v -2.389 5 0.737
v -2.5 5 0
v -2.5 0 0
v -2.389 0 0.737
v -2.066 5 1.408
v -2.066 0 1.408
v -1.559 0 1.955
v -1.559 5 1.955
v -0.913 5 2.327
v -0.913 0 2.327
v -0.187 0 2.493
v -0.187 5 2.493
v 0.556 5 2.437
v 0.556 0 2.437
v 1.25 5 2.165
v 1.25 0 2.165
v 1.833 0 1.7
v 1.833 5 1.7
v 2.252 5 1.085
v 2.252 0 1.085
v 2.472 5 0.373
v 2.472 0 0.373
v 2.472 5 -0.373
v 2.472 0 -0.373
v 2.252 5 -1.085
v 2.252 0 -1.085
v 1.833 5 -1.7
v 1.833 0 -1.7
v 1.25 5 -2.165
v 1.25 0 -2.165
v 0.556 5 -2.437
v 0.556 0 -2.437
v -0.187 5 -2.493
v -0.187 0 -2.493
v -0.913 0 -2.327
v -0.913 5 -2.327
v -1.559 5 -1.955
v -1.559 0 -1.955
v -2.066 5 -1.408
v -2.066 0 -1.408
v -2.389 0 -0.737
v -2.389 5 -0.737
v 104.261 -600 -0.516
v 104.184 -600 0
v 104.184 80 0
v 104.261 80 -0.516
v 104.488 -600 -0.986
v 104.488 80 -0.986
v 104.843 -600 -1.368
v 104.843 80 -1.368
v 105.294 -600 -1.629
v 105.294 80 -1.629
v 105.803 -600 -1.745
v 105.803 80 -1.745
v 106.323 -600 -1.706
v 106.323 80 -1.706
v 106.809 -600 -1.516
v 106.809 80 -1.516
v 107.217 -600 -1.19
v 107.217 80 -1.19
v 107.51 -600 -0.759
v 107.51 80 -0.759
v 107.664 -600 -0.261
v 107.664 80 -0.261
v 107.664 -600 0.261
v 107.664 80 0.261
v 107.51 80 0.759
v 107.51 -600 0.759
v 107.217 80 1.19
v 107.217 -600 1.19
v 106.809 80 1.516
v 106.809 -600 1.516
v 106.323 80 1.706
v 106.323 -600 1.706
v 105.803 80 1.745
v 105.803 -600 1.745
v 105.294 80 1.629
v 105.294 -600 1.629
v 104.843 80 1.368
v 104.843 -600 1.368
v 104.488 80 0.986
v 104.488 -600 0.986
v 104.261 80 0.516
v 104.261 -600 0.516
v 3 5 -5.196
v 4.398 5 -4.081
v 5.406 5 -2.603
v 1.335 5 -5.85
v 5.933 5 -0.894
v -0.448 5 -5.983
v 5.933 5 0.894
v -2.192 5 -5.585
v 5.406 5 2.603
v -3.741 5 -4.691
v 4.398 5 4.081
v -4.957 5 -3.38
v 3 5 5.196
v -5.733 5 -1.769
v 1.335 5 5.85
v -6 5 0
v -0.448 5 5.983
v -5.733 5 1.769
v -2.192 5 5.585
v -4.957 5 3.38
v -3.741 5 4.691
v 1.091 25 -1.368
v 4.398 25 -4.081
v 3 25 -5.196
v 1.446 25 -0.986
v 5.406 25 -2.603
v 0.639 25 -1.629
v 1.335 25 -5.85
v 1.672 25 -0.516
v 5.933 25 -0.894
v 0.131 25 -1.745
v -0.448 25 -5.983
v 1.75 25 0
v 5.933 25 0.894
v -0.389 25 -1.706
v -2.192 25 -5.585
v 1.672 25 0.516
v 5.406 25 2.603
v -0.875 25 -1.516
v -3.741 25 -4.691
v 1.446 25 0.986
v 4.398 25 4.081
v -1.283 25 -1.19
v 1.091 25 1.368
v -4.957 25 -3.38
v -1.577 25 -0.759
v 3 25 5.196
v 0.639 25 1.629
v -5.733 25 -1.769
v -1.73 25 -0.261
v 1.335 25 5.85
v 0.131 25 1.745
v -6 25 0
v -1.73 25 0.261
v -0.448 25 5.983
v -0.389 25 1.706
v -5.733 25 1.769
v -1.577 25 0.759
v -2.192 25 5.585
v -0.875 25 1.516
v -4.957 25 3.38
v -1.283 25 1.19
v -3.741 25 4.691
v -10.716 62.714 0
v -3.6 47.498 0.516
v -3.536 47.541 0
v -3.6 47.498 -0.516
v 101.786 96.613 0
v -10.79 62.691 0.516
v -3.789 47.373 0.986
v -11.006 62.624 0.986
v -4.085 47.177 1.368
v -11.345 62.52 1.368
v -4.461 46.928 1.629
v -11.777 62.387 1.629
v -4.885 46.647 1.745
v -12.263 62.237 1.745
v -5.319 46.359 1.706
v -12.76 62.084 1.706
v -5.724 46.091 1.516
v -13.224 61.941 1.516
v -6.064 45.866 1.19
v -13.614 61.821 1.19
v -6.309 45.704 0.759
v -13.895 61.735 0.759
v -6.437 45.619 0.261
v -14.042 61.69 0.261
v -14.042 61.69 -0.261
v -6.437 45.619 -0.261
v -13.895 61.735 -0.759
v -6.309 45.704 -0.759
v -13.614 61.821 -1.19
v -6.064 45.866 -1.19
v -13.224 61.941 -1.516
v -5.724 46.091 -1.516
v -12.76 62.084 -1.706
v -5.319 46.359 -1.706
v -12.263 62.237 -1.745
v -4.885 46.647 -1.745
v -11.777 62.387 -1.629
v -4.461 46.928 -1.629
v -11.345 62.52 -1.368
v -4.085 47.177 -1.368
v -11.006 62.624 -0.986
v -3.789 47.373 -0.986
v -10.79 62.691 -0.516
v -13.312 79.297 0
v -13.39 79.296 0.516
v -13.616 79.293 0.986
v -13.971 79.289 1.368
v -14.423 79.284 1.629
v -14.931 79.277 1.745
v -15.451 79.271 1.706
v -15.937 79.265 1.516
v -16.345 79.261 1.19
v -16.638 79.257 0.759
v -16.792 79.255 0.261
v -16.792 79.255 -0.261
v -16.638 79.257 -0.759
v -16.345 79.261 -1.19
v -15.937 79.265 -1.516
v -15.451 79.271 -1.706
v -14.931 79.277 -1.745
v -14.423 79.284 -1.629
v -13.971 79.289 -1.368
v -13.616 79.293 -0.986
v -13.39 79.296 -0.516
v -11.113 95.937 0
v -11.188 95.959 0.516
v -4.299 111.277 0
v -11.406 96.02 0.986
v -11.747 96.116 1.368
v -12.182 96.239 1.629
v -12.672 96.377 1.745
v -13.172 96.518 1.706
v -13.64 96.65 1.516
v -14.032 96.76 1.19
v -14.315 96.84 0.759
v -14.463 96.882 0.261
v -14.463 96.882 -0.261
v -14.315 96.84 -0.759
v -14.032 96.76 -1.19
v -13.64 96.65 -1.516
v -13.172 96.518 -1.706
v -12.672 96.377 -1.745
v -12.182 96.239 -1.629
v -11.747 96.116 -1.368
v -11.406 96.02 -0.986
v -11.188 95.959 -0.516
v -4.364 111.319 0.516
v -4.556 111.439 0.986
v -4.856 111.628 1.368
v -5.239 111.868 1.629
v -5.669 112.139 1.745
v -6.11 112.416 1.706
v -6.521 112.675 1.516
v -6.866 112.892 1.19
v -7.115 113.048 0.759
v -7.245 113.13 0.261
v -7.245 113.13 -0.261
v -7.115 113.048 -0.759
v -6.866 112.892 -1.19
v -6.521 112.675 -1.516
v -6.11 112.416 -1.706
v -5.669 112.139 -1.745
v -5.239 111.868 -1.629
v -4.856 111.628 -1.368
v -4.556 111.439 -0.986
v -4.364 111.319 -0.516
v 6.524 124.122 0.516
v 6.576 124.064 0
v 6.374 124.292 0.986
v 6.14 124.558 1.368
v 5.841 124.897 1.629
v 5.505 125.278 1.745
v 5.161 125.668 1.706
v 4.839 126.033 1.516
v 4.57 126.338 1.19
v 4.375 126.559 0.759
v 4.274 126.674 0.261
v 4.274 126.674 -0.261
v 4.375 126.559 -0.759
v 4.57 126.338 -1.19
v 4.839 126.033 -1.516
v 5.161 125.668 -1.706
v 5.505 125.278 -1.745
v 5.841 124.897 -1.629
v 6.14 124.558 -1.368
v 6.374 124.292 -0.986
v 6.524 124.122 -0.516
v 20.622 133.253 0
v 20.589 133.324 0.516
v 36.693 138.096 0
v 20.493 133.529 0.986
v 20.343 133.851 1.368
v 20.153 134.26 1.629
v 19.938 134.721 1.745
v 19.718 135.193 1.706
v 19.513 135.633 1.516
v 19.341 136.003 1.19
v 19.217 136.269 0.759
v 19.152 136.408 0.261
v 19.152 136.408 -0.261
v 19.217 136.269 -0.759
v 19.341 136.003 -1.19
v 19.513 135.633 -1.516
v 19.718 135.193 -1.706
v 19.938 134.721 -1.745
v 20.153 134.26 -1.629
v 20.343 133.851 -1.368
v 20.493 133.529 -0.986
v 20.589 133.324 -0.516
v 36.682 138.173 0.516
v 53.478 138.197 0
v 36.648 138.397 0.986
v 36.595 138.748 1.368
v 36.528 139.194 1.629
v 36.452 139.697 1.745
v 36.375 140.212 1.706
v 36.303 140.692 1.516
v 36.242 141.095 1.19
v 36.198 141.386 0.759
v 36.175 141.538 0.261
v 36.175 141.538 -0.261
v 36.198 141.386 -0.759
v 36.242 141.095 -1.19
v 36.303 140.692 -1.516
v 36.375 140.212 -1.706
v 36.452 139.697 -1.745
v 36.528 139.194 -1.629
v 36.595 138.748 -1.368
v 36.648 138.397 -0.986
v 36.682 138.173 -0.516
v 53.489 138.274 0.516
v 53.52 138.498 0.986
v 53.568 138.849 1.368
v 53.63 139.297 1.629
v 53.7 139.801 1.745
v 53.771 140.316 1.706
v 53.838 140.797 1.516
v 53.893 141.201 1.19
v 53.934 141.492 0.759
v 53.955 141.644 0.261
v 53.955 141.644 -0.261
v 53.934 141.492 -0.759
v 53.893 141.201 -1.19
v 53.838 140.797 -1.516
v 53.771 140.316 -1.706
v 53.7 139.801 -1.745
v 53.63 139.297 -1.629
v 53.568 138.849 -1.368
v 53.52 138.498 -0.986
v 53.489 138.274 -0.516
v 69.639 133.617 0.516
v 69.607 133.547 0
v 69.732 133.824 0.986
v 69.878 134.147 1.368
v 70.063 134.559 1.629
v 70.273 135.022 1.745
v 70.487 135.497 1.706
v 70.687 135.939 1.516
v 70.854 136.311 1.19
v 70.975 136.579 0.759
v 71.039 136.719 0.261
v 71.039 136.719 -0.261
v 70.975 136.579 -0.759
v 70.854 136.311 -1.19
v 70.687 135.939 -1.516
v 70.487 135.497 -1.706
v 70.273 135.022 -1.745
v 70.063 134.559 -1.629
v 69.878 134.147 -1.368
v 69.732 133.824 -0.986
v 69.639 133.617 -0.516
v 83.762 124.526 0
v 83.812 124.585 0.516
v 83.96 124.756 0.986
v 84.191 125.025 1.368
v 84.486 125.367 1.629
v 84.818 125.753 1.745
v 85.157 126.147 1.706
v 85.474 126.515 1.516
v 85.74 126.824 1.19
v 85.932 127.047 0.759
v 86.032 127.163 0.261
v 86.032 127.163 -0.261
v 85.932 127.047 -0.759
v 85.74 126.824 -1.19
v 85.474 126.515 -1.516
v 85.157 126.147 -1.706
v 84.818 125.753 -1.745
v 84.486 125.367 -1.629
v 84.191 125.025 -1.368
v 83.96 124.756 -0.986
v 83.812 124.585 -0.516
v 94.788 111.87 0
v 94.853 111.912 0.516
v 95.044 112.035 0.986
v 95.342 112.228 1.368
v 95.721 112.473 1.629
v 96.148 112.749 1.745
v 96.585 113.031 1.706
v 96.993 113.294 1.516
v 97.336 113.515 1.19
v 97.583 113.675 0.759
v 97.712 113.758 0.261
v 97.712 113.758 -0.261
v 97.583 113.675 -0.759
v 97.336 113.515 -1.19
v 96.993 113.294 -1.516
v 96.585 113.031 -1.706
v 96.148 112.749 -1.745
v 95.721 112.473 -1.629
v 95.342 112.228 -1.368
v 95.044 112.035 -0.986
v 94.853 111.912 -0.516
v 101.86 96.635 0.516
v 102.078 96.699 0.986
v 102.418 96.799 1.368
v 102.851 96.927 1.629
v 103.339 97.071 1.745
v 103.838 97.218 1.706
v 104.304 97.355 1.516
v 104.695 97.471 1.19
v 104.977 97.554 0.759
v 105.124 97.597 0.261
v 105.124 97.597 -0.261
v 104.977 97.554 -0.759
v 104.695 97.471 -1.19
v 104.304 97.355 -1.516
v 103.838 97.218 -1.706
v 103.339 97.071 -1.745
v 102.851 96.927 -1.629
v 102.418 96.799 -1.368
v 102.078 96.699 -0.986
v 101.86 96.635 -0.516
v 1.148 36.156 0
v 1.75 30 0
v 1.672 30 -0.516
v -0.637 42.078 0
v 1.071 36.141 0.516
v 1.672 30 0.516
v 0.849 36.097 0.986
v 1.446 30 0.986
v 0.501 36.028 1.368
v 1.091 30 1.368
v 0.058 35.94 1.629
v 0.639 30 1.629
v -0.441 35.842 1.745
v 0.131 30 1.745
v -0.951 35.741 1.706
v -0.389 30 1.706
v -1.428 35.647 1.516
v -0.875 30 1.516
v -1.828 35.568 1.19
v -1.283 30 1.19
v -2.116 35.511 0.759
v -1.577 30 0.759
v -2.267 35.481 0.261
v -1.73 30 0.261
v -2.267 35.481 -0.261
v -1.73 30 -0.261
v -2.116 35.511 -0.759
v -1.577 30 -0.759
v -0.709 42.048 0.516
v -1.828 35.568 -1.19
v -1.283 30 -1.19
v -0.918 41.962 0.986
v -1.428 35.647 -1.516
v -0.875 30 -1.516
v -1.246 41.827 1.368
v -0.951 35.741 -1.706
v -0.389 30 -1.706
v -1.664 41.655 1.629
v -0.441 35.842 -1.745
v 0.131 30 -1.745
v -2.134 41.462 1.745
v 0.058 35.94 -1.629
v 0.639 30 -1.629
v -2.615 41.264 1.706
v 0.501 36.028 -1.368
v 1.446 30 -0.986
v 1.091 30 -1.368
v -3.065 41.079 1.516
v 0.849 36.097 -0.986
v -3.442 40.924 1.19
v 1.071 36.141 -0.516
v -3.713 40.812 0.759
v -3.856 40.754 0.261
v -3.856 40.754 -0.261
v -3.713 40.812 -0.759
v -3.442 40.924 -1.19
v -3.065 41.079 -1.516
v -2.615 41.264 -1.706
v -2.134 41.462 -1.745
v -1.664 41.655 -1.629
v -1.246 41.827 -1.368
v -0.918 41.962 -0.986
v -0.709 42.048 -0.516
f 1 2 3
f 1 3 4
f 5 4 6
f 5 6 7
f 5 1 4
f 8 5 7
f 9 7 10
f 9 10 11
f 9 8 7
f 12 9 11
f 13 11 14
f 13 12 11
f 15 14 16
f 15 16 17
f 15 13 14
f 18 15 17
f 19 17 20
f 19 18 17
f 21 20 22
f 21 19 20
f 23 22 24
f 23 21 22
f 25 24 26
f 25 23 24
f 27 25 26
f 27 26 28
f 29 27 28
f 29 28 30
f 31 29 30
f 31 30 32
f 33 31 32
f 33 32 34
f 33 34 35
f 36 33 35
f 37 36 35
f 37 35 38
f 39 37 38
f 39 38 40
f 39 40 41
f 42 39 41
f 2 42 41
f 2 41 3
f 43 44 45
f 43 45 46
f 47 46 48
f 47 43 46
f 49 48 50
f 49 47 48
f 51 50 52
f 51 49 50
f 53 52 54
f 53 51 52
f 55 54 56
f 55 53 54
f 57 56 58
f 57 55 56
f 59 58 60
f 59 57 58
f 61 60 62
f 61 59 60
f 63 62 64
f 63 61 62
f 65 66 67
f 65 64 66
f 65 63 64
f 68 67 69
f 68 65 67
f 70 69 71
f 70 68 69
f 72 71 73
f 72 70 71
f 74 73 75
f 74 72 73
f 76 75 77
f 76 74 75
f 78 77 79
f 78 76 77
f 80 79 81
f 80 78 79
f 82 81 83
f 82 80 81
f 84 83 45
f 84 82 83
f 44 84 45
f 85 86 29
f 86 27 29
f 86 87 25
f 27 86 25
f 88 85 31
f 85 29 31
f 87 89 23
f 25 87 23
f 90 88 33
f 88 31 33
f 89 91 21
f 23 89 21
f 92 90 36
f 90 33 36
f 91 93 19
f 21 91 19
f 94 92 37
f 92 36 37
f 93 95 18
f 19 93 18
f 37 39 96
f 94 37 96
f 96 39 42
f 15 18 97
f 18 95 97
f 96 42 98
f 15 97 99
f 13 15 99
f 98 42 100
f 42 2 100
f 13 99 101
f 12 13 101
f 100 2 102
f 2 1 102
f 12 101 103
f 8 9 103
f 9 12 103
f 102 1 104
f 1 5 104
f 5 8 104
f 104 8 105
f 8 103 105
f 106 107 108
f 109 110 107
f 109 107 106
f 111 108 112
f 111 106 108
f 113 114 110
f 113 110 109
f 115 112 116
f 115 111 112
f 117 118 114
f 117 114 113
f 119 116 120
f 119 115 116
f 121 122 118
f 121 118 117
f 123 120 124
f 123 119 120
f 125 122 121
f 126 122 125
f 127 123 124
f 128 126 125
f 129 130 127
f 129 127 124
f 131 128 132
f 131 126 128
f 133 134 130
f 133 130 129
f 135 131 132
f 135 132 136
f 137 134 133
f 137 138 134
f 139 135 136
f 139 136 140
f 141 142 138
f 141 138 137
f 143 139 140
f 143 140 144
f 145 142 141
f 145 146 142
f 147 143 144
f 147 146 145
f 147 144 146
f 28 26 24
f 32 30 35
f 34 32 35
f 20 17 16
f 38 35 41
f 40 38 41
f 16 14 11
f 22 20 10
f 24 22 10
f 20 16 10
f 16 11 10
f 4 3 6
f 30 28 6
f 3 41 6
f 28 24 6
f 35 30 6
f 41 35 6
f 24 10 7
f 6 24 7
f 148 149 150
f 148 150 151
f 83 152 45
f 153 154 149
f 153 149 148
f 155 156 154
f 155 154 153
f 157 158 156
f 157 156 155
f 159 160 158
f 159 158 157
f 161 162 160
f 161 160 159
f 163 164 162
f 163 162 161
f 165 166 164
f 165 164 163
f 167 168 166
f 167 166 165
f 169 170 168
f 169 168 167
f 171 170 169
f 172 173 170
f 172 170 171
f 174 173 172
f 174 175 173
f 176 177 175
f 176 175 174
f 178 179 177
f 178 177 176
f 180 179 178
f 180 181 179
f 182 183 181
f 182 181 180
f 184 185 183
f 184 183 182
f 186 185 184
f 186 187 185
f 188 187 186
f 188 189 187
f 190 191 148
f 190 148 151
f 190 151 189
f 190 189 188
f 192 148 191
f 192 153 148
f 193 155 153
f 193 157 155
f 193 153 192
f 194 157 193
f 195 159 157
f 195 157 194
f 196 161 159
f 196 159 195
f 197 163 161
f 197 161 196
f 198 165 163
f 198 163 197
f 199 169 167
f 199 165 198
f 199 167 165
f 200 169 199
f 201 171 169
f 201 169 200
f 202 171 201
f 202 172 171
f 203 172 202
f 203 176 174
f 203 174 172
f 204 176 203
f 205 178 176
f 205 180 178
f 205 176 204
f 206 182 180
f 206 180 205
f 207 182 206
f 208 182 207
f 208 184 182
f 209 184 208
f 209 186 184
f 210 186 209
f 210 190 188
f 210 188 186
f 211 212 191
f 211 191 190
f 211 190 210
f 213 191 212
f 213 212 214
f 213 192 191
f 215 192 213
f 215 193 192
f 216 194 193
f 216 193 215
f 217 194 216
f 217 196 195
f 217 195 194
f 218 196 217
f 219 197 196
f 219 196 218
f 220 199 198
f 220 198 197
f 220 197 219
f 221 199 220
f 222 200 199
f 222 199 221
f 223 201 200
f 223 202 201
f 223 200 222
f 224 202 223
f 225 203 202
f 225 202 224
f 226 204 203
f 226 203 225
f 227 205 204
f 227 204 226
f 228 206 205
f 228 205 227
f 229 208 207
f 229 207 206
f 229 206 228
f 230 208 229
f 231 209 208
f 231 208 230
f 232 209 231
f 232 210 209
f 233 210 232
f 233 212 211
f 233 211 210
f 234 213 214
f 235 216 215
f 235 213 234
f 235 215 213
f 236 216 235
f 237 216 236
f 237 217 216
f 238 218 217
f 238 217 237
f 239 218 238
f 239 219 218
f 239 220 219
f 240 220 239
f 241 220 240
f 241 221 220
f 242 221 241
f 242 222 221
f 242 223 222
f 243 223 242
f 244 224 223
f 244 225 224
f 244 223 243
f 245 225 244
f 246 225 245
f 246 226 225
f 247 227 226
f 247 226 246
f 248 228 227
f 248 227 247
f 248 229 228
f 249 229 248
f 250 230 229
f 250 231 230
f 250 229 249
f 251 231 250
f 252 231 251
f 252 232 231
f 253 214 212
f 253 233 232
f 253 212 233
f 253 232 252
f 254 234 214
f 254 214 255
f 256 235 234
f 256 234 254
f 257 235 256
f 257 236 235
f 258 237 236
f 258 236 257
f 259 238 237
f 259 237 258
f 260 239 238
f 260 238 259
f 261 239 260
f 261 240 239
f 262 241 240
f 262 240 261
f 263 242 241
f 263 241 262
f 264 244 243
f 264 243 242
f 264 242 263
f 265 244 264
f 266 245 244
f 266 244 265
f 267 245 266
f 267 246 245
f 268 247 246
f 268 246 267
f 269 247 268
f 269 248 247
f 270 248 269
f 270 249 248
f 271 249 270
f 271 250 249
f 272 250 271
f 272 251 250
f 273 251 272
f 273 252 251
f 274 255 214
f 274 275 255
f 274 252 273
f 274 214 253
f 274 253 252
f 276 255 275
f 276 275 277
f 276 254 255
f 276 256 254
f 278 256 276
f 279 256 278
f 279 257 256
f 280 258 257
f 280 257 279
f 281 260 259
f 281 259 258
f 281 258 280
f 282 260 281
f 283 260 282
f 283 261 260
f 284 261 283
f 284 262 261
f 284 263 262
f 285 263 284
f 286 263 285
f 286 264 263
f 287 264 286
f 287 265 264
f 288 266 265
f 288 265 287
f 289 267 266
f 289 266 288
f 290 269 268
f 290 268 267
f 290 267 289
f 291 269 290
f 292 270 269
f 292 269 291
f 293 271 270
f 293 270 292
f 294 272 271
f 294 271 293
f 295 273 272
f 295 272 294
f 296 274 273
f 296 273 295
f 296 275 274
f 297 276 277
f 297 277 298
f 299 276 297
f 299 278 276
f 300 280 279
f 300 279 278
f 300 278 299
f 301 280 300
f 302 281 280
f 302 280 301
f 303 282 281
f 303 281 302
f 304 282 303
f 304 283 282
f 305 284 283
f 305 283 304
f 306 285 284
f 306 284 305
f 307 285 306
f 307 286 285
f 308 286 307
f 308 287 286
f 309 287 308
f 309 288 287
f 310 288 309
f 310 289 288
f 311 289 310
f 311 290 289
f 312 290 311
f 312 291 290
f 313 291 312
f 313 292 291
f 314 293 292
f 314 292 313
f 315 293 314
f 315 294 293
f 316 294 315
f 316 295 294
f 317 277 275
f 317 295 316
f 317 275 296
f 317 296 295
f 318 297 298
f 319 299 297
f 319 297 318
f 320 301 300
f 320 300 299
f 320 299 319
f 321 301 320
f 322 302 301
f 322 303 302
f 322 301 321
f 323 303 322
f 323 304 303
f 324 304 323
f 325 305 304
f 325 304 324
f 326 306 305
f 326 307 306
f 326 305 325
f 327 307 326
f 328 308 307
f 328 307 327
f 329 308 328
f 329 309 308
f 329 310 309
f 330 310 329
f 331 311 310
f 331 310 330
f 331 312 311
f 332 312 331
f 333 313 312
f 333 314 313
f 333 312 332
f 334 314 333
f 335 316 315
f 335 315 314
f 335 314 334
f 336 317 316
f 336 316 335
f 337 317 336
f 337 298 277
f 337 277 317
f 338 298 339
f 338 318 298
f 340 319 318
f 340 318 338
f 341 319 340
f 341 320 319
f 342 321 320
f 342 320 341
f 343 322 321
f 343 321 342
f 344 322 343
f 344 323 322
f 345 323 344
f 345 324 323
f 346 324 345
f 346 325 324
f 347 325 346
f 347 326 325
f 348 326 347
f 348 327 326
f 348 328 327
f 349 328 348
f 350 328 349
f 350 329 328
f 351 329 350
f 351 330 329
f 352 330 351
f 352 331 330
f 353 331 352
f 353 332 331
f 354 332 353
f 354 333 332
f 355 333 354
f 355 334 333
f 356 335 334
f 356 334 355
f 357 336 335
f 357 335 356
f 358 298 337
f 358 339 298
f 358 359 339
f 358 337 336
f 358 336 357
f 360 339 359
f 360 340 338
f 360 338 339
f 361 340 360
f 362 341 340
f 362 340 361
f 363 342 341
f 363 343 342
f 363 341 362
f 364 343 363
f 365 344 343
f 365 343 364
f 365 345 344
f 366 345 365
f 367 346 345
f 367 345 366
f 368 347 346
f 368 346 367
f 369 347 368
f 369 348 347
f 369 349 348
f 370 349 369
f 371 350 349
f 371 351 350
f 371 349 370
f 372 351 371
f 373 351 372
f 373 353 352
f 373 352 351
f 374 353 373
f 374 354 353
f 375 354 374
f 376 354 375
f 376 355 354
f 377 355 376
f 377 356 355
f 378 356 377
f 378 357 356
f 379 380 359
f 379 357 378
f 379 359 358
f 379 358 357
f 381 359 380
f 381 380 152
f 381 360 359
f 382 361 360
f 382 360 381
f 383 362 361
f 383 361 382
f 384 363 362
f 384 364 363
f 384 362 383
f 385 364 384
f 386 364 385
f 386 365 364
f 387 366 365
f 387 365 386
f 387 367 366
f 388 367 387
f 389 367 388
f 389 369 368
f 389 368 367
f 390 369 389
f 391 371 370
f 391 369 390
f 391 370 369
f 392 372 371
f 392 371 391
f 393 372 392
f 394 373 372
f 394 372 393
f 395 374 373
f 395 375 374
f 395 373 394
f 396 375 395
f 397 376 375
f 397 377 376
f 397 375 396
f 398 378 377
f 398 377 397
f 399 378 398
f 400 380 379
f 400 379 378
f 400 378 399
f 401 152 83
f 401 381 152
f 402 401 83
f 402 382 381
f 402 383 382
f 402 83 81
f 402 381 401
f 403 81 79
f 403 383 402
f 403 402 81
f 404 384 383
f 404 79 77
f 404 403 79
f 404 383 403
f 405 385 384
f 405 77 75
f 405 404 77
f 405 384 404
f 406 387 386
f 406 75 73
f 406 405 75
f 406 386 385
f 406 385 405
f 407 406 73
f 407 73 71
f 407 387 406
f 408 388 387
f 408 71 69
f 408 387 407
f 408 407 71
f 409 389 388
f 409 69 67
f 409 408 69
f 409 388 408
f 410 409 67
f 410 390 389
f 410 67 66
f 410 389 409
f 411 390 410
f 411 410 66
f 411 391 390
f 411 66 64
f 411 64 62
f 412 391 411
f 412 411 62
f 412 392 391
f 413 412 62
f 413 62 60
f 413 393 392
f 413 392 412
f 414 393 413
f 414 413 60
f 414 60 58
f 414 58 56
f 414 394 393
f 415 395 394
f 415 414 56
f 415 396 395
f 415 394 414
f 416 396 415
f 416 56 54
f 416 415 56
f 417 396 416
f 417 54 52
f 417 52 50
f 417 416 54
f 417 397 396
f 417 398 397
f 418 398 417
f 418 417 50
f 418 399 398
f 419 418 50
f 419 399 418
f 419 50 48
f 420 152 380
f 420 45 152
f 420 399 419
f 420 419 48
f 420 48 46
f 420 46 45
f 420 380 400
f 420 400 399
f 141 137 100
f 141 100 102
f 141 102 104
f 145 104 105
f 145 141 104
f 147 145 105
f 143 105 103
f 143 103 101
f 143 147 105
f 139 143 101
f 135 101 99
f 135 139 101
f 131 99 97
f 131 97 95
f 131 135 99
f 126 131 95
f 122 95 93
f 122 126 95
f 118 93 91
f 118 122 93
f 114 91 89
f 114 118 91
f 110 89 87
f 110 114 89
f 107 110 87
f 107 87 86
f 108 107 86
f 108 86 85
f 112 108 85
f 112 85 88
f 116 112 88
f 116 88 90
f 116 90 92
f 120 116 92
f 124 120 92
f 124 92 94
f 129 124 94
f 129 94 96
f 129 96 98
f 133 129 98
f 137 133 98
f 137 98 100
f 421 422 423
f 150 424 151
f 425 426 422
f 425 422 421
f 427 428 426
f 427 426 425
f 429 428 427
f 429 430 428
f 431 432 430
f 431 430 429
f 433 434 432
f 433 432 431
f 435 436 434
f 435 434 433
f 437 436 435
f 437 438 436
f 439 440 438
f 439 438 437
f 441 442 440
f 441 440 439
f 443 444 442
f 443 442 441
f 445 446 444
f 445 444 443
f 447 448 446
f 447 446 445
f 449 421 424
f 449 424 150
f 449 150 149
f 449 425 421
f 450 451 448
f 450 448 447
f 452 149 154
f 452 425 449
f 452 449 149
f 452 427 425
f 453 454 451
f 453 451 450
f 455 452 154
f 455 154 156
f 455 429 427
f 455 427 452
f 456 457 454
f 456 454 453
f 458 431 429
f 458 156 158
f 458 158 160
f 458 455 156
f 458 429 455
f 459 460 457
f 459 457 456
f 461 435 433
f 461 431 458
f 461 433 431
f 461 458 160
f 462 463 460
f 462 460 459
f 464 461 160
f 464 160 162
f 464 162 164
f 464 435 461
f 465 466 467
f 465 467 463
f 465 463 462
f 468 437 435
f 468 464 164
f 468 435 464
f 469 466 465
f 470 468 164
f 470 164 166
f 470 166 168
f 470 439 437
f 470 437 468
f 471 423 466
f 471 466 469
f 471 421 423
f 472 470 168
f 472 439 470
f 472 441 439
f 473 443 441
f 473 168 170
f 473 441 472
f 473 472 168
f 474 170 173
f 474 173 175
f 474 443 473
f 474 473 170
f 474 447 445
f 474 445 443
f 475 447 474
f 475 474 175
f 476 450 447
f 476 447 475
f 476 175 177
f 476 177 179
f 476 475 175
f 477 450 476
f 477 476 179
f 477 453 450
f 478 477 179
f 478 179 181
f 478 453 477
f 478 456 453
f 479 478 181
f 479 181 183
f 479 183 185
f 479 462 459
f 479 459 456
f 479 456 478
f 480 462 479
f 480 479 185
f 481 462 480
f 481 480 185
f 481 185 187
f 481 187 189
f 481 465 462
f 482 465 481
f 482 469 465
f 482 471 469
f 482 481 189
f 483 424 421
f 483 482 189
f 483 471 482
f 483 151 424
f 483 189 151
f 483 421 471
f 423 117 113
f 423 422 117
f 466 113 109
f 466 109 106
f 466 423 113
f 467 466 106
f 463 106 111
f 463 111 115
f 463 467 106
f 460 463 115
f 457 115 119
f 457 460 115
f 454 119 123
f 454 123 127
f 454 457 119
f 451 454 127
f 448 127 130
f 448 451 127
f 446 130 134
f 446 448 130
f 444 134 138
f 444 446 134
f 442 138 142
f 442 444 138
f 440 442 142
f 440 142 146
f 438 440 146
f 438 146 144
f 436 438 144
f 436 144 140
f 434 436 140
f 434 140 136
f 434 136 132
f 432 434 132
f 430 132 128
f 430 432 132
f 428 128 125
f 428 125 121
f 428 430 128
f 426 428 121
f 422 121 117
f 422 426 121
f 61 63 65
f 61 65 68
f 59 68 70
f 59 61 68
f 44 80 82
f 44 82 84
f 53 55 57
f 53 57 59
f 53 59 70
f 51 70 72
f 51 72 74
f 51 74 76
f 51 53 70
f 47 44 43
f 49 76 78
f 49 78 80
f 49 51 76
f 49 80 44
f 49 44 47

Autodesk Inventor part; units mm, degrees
ref_plane "YZ Plane" through (0, 0, 0) normal (1, 0, 0) x (0, 1, 0)
ref_plane "XZ Plane" through (0, 0, 0) normal (0, 1, 0) x (-1, 0, 0)
ref_plane "XY Plane" through (0, 0, 0) normal (0, 0, 1) x (1, 0, 0)
sketch "Sketch1" plane through (0, 0, 0) normal (0, 0, 1) x (1, 0, 0)
  line L0 (-7.2, 0) -> (1.2, 0) construction
  line L1 (0, -5) -> (0, 30) construction
  line L2 (0, 0) -> (-2.5, 0)
  line L3 (-2.5, 0) -> (-2.5, 5)
  line L4 (-2.5, 5) -> (-6, 5)
  line L5 (-6, 5) -> (-6, 25)
  line L6 (-6, 25) -> (0, 25)
  line L7 (0, 25) -> (0, 0)
  dimension "d0" = 5
  dimension "d1" = 12
  dimension "d2" = 5
  dimension "d3" = 25
revolve "Revolution1" add sketch "Sketch1" angle 360 about axis through (0, -10, 0) along (0, 1, 0)
sketch "Sketch2" plane through (0, 0, 0) normal (0, 0, 1) x (1, 0, 0)
  line L0 (0, -5) -> (0, 30) construction
  line L1 (6, 25) -> (-6, 25) construction
  line L2 (0, 25) -> (0, 30)
  line L3 (105.9337, -600) -> (105.9337, 80)
  arc A0 (105.9337, 80) -> (-4.9943, 46.5746) centre (45.4337, 80) ccw
  arc A1 (0, 30) -> (-4.9943, 46.5746) centre (-30, 30) ccw
  line L4 (-74.1691, 0) -> (235.0145, 0) projected
  point P0 (0, 0)
  point P1 (0, 40.0497)
  dimension "d5" = 30
  dimension "d9" = 5
  dimension "d10" = 60.5
  dimension "d11" = 80
  dimension "d12" = 600
sketch "Sketch3" plane through (0, 25, 0) normal (0, 1, 0) x (1, 0, 0)
  circle A0 centre (0, 0) radius 1.75
  dimension "d6" = 3.5
sweep "Sweep1" add profiles "Sketch3" path "Sketch2" path curves L2 A1 A0 L3
properties part number "F118Laser"
